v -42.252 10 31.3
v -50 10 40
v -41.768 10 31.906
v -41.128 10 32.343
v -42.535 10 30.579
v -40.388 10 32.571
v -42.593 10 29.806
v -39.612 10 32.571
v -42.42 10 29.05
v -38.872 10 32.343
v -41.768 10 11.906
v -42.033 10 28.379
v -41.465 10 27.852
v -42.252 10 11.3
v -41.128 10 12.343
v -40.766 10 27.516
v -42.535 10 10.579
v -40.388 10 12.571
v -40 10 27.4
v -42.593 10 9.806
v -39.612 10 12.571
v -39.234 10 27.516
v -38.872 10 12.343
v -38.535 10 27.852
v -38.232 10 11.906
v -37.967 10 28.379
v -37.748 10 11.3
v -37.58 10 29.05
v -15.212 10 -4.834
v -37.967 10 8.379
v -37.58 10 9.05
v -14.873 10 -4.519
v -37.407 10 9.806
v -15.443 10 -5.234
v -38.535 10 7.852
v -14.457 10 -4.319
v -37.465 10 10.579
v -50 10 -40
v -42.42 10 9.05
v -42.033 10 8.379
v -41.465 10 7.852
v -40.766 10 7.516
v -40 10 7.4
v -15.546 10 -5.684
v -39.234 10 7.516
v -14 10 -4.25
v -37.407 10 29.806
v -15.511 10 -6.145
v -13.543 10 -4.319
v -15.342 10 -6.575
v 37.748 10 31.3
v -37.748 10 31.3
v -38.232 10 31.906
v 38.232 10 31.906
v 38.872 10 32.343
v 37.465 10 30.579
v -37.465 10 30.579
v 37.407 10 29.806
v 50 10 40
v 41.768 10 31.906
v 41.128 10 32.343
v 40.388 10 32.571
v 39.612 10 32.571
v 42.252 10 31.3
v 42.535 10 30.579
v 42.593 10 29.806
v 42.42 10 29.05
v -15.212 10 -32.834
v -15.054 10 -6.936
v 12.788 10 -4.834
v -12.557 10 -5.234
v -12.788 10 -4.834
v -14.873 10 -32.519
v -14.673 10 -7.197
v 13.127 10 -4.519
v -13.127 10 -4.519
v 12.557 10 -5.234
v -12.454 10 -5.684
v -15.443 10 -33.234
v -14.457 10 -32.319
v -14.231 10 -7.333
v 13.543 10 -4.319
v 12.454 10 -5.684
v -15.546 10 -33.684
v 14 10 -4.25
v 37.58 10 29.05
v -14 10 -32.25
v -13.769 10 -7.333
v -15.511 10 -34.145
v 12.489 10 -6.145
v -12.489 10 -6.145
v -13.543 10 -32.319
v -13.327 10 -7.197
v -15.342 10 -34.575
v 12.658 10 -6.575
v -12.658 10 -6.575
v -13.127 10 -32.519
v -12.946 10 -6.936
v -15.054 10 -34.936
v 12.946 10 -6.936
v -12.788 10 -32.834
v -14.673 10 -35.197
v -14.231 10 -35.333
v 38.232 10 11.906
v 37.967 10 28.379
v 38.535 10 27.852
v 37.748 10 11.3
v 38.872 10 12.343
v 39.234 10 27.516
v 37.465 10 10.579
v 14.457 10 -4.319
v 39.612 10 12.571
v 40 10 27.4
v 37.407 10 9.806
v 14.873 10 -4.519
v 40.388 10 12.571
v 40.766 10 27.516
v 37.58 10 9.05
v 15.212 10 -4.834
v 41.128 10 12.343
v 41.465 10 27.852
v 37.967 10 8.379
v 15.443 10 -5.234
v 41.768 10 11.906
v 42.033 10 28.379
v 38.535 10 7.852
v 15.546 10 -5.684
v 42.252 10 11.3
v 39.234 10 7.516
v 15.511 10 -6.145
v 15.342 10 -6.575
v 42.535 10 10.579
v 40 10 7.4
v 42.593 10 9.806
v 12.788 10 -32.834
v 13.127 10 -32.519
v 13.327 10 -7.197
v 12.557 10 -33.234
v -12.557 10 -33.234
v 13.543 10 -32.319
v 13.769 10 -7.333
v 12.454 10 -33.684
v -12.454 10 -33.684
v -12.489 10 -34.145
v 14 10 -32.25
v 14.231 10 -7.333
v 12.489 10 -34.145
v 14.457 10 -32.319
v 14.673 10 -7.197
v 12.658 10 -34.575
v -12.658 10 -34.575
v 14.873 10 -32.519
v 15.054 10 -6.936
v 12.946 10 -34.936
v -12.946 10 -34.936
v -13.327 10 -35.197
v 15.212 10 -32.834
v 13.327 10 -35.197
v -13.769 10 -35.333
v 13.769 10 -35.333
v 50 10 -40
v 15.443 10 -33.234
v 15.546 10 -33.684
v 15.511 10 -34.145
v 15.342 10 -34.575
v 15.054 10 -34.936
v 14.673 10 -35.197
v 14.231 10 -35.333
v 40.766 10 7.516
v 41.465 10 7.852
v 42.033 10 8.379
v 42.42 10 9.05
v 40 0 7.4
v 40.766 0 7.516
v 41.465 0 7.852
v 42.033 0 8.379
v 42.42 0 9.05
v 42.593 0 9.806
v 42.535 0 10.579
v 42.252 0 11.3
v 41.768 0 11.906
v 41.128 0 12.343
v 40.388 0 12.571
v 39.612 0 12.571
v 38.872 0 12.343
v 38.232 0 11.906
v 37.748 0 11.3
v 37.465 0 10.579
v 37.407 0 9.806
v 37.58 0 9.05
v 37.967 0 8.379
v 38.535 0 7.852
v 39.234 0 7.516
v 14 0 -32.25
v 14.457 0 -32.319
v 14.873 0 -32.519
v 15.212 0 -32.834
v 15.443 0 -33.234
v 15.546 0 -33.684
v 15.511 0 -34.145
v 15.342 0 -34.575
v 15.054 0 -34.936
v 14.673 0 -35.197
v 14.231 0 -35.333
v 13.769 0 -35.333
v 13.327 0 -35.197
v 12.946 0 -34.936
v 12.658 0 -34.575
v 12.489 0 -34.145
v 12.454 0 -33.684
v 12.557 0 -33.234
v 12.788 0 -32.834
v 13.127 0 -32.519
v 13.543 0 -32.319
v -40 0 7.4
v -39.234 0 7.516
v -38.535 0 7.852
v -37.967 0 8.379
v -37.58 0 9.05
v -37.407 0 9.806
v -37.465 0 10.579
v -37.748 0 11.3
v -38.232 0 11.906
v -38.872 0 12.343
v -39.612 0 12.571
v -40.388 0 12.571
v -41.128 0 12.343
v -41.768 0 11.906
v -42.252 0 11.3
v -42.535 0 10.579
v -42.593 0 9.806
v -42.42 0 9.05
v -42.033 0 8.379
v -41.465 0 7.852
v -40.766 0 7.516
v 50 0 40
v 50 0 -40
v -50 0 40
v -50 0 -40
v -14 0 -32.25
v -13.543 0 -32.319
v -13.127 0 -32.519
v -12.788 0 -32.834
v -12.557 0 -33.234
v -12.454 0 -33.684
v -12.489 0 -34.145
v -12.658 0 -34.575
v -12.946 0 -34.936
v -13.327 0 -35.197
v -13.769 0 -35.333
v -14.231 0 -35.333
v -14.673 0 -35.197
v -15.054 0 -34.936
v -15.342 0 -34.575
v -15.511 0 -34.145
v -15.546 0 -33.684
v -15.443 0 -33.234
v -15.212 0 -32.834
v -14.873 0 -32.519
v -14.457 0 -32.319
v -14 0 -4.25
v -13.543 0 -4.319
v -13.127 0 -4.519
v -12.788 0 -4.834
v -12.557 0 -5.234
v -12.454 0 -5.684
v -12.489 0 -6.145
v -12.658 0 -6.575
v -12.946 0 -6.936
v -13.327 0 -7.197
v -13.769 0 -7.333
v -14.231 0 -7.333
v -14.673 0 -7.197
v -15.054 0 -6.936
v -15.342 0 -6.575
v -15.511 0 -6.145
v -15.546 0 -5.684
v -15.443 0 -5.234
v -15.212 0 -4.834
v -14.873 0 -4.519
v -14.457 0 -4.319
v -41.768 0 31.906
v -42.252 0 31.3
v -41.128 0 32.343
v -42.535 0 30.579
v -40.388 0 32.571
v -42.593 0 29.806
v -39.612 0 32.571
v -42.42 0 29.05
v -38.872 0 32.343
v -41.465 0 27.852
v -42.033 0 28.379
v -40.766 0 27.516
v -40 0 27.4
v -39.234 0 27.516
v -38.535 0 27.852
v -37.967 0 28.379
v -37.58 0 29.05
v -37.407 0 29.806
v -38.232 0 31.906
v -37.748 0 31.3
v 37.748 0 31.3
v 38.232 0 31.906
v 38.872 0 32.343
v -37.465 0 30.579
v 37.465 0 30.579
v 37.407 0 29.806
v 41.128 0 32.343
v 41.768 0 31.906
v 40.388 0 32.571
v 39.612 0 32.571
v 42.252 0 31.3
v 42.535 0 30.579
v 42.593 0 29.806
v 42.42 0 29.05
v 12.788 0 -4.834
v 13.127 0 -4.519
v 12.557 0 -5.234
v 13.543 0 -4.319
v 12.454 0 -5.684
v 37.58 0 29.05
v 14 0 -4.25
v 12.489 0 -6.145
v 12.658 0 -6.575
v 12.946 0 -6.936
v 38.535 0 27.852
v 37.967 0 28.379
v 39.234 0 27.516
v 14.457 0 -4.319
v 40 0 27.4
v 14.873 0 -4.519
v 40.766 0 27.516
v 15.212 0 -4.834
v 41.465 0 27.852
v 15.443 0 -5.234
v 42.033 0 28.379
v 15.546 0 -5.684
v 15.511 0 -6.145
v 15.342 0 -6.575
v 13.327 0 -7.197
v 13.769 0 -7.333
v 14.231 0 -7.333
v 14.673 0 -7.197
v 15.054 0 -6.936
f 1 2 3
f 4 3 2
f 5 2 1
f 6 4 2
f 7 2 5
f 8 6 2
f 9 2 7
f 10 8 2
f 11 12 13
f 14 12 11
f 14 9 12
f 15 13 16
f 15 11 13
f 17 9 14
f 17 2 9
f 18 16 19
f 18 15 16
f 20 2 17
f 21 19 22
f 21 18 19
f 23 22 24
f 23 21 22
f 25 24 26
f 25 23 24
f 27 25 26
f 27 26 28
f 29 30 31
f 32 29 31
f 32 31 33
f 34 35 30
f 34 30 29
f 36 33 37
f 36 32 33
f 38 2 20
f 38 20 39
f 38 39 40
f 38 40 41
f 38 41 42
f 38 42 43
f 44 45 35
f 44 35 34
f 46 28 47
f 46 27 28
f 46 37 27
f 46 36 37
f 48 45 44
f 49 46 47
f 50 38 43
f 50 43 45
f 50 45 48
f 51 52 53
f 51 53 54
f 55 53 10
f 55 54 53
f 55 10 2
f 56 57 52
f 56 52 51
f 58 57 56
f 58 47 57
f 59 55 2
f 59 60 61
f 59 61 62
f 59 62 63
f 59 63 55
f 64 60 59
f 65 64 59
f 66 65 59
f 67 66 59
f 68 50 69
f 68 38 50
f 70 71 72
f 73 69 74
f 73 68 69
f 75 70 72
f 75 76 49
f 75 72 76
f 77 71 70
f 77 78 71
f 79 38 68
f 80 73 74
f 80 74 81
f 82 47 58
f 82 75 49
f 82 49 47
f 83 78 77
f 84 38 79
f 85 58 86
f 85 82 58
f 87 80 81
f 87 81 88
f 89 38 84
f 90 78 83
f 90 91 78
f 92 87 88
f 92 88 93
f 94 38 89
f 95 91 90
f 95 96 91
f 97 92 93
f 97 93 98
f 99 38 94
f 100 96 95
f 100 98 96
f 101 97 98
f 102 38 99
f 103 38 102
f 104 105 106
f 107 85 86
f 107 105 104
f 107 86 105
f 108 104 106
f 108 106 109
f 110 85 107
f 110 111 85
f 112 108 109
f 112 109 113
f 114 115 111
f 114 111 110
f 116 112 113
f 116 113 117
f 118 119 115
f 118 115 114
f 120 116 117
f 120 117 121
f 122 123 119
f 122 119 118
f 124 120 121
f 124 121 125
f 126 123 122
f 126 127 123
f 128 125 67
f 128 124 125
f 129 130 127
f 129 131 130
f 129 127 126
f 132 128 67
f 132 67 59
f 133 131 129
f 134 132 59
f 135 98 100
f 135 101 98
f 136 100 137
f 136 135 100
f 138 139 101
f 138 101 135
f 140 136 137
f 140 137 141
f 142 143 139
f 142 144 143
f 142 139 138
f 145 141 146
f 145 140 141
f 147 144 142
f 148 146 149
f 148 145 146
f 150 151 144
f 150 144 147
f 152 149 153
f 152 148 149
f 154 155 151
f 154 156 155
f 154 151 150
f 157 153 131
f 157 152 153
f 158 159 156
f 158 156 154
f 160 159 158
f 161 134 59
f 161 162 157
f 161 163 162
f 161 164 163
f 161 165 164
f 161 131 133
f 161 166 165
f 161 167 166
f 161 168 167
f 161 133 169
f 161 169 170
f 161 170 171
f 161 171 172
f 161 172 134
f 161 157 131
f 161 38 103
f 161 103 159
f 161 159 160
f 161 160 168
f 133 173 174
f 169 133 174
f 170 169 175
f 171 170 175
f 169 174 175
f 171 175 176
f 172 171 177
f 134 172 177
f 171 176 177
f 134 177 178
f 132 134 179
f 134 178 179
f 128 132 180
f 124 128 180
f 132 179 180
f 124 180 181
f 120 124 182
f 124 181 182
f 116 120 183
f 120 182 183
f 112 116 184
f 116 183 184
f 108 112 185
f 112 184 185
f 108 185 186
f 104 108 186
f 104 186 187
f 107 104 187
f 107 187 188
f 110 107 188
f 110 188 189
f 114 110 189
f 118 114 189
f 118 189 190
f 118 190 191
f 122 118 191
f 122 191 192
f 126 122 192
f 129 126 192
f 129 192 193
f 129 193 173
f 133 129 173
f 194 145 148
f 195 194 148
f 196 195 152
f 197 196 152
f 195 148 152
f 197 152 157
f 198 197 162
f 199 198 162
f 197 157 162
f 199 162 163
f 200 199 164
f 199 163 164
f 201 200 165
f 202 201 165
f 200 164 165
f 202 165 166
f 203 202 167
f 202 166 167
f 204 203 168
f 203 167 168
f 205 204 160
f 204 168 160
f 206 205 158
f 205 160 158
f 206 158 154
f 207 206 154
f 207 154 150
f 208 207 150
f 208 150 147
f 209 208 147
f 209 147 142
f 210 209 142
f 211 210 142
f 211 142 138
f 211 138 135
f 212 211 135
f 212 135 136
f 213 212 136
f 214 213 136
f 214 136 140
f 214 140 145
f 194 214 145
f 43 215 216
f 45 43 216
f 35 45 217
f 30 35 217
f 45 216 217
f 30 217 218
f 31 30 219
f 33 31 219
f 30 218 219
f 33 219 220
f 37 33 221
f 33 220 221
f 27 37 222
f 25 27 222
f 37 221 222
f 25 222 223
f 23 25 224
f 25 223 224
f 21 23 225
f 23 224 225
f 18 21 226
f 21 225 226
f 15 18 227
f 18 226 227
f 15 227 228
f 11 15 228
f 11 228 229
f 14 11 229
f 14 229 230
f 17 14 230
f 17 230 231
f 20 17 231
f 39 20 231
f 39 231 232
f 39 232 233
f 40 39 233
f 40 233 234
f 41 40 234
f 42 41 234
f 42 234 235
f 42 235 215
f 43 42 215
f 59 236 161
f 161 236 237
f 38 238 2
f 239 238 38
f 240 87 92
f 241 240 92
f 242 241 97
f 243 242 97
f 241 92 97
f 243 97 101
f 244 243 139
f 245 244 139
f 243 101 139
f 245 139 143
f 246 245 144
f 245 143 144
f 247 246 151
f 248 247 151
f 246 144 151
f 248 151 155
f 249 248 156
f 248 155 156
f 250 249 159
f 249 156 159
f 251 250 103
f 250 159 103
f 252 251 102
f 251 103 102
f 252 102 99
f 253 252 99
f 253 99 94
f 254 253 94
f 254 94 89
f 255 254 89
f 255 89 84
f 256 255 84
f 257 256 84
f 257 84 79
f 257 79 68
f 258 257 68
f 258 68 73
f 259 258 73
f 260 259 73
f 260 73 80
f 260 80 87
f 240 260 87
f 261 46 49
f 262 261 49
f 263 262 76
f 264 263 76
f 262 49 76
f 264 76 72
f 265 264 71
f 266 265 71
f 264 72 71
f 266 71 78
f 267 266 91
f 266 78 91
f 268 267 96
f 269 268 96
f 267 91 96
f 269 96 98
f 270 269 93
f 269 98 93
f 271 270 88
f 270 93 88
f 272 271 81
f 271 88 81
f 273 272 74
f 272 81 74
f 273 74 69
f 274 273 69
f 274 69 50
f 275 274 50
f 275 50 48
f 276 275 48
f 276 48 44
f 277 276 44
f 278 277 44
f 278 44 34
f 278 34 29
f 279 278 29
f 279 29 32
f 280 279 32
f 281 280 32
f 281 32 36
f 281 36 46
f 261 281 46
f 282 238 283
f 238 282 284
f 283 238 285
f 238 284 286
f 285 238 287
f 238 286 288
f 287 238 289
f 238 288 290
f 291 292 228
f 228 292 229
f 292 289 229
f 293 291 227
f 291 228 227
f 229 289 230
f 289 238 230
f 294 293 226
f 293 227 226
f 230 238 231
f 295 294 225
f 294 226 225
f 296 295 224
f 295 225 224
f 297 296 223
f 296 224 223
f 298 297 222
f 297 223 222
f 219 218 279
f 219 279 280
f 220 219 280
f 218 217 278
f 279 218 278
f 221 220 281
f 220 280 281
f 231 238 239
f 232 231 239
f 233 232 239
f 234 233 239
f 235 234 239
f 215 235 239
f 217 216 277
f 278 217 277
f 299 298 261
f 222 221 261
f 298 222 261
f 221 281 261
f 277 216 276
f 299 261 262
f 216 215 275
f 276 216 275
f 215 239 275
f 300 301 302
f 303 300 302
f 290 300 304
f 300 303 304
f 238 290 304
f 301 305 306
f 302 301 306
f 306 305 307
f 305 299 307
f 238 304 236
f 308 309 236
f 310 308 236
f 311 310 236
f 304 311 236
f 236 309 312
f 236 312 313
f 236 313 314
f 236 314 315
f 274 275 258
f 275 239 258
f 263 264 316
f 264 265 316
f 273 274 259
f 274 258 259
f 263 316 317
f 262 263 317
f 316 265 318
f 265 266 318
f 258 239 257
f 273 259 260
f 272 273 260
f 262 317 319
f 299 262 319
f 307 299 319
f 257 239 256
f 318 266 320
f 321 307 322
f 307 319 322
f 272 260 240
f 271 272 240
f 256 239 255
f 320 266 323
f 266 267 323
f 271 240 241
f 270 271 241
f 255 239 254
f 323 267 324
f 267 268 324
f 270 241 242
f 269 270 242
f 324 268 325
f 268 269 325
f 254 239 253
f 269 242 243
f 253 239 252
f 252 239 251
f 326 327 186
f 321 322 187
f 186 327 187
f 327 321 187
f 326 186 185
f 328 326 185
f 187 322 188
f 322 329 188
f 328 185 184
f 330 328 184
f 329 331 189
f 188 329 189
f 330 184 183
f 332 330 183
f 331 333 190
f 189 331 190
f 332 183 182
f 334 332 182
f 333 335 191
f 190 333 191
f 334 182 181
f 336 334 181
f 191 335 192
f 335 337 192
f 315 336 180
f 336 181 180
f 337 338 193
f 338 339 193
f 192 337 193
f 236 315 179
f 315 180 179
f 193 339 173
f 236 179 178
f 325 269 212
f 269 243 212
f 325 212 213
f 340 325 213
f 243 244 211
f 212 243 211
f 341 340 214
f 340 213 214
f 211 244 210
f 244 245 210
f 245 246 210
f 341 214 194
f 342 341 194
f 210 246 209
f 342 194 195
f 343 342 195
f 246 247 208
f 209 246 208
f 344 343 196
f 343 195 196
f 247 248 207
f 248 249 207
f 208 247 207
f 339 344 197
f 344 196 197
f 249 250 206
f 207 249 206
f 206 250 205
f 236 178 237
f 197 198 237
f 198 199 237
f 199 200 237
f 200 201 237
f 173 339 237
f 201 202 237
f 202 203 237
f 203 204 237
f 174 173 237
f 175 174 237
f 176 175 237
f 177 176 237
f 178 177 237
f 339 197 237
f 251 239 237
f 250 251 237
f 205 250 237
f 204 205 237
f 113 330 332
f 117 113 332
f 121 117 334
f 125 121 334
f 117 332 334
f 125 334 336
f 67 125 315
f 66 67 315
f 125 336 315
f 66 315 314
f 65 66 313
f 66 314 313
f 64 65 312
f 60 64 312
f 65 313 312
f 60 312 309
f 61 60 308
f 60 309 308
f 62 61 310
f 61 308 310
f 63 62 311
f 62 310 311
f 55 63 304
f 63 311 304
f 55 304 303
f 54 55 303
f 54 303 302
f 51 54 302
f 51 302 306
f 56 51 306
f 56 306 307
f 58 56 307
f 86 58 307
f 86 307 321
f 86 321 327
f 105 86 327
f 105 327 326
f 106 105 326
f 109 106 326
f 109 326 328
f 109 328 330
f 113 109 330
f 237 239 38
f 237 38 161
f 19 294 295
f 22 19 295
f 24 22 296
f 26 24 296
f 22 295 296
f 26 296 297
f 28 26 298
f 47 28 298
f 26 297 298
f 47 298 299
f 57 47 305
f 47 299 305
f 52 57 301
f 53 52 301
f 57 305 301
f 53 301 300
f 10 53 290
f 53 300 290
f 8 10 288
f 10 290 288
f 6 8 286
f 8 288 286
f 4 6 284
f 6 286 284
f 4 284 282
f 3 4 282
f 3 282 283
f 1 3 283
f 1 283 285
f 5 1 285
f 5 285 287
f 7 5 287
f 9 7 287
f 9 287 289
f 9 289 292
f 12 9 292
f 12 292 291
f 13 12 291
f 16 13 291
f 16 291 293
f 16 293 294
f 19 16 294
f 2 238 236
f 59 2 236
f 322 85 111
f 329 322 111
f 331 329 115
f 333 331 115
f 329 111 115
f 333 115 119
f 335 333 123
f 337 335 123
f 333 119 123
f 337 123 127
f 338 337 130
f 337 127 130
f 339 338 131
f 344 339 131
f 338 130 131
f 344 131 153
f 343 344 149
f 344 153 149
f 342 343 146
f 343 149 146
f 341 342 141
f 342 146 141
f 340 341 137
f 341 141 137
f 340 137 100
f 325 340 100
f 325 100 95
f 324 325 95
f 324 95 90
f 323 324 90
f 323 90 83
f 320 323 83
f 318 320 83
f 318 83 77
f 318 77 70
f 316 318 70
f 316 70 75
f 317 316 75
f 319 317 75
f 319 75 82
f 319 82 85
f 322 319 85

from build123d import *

# Parameters (mm, degrees)
SKETCH_1_W          = 100
SKETCH_1_H          = 80
EXTRUDE_1_DEPTH     = 10
SKETCH_3_R          = 2.6
CUT_EXTRUDE_2_DEPTH = 65.807406984
SKETCH_4_R          = 1.55
CUT_EXTRUDE_3_DEPTH = 65.807406984


with BuildPart() as part:
    # 草图1 → 凸台-拉伸1 (new body)
    with BuildSketch(Plane(origin=(0, 0, 0), x_dir=(1, 0, 0), z_dir=(0, 1, 0))):
        Rectangle(SKETCH_1_W, SKETCH_1_H)
    extrude(amount=EXTRUDE_1_DEPTH)

    # 草图3 → 切除-拉伸2 (cut, through all)
    with BuildSketch(Plane.XZ):
        with Locations(Location((40, 30, 0), (0, 0, 270))):
            Circle(SKETCH_3_R)
        with Locations(Location((40, 10, 0), (0, 0, 270))):
            Circle(SKETCH_3_R)
        with Locations(Location((-40, 30, 0), (0, 0, 270))):
            Circle(SKETCH_3_R)
        with Locations(Location((-40, 10, 0), (0, 0, 270))):
            Circle(SKETCH_3_R)
    extrude(amount=-CUT_EXTRUDE_2_DEPTH, mode=Mode.SUBTRACT)

    # 草图4 → 切除-拉伸3 (cut, through all)
    with BuildSketch(Plane(origin=(0, 10, 0), x_dir=(1, 0, 0), z_dir=(0, 1, 0))):
        with Locations(Location((14, 33.8, 0), (0, 0, 270))):
            Circle(SKETCH_4_R)
        with Locations(Location((14, 5.8, 0), (0, 0, 270))):
            Circle(SKETCH_4_R)
        with Locations(Location((-14, 33.8, 0), (0, 0, 270))):
            Circle(SKETCH_4_R)
        with Locations(Location((-14, 5.8, 0), (0, 0, 270))):
            Circle(SKETCH_4_R)
    extrude(amount=-CUT_EXTRUDE_3_DEPTH, mode=Mode.SUBTRACT)


solid = part.part
